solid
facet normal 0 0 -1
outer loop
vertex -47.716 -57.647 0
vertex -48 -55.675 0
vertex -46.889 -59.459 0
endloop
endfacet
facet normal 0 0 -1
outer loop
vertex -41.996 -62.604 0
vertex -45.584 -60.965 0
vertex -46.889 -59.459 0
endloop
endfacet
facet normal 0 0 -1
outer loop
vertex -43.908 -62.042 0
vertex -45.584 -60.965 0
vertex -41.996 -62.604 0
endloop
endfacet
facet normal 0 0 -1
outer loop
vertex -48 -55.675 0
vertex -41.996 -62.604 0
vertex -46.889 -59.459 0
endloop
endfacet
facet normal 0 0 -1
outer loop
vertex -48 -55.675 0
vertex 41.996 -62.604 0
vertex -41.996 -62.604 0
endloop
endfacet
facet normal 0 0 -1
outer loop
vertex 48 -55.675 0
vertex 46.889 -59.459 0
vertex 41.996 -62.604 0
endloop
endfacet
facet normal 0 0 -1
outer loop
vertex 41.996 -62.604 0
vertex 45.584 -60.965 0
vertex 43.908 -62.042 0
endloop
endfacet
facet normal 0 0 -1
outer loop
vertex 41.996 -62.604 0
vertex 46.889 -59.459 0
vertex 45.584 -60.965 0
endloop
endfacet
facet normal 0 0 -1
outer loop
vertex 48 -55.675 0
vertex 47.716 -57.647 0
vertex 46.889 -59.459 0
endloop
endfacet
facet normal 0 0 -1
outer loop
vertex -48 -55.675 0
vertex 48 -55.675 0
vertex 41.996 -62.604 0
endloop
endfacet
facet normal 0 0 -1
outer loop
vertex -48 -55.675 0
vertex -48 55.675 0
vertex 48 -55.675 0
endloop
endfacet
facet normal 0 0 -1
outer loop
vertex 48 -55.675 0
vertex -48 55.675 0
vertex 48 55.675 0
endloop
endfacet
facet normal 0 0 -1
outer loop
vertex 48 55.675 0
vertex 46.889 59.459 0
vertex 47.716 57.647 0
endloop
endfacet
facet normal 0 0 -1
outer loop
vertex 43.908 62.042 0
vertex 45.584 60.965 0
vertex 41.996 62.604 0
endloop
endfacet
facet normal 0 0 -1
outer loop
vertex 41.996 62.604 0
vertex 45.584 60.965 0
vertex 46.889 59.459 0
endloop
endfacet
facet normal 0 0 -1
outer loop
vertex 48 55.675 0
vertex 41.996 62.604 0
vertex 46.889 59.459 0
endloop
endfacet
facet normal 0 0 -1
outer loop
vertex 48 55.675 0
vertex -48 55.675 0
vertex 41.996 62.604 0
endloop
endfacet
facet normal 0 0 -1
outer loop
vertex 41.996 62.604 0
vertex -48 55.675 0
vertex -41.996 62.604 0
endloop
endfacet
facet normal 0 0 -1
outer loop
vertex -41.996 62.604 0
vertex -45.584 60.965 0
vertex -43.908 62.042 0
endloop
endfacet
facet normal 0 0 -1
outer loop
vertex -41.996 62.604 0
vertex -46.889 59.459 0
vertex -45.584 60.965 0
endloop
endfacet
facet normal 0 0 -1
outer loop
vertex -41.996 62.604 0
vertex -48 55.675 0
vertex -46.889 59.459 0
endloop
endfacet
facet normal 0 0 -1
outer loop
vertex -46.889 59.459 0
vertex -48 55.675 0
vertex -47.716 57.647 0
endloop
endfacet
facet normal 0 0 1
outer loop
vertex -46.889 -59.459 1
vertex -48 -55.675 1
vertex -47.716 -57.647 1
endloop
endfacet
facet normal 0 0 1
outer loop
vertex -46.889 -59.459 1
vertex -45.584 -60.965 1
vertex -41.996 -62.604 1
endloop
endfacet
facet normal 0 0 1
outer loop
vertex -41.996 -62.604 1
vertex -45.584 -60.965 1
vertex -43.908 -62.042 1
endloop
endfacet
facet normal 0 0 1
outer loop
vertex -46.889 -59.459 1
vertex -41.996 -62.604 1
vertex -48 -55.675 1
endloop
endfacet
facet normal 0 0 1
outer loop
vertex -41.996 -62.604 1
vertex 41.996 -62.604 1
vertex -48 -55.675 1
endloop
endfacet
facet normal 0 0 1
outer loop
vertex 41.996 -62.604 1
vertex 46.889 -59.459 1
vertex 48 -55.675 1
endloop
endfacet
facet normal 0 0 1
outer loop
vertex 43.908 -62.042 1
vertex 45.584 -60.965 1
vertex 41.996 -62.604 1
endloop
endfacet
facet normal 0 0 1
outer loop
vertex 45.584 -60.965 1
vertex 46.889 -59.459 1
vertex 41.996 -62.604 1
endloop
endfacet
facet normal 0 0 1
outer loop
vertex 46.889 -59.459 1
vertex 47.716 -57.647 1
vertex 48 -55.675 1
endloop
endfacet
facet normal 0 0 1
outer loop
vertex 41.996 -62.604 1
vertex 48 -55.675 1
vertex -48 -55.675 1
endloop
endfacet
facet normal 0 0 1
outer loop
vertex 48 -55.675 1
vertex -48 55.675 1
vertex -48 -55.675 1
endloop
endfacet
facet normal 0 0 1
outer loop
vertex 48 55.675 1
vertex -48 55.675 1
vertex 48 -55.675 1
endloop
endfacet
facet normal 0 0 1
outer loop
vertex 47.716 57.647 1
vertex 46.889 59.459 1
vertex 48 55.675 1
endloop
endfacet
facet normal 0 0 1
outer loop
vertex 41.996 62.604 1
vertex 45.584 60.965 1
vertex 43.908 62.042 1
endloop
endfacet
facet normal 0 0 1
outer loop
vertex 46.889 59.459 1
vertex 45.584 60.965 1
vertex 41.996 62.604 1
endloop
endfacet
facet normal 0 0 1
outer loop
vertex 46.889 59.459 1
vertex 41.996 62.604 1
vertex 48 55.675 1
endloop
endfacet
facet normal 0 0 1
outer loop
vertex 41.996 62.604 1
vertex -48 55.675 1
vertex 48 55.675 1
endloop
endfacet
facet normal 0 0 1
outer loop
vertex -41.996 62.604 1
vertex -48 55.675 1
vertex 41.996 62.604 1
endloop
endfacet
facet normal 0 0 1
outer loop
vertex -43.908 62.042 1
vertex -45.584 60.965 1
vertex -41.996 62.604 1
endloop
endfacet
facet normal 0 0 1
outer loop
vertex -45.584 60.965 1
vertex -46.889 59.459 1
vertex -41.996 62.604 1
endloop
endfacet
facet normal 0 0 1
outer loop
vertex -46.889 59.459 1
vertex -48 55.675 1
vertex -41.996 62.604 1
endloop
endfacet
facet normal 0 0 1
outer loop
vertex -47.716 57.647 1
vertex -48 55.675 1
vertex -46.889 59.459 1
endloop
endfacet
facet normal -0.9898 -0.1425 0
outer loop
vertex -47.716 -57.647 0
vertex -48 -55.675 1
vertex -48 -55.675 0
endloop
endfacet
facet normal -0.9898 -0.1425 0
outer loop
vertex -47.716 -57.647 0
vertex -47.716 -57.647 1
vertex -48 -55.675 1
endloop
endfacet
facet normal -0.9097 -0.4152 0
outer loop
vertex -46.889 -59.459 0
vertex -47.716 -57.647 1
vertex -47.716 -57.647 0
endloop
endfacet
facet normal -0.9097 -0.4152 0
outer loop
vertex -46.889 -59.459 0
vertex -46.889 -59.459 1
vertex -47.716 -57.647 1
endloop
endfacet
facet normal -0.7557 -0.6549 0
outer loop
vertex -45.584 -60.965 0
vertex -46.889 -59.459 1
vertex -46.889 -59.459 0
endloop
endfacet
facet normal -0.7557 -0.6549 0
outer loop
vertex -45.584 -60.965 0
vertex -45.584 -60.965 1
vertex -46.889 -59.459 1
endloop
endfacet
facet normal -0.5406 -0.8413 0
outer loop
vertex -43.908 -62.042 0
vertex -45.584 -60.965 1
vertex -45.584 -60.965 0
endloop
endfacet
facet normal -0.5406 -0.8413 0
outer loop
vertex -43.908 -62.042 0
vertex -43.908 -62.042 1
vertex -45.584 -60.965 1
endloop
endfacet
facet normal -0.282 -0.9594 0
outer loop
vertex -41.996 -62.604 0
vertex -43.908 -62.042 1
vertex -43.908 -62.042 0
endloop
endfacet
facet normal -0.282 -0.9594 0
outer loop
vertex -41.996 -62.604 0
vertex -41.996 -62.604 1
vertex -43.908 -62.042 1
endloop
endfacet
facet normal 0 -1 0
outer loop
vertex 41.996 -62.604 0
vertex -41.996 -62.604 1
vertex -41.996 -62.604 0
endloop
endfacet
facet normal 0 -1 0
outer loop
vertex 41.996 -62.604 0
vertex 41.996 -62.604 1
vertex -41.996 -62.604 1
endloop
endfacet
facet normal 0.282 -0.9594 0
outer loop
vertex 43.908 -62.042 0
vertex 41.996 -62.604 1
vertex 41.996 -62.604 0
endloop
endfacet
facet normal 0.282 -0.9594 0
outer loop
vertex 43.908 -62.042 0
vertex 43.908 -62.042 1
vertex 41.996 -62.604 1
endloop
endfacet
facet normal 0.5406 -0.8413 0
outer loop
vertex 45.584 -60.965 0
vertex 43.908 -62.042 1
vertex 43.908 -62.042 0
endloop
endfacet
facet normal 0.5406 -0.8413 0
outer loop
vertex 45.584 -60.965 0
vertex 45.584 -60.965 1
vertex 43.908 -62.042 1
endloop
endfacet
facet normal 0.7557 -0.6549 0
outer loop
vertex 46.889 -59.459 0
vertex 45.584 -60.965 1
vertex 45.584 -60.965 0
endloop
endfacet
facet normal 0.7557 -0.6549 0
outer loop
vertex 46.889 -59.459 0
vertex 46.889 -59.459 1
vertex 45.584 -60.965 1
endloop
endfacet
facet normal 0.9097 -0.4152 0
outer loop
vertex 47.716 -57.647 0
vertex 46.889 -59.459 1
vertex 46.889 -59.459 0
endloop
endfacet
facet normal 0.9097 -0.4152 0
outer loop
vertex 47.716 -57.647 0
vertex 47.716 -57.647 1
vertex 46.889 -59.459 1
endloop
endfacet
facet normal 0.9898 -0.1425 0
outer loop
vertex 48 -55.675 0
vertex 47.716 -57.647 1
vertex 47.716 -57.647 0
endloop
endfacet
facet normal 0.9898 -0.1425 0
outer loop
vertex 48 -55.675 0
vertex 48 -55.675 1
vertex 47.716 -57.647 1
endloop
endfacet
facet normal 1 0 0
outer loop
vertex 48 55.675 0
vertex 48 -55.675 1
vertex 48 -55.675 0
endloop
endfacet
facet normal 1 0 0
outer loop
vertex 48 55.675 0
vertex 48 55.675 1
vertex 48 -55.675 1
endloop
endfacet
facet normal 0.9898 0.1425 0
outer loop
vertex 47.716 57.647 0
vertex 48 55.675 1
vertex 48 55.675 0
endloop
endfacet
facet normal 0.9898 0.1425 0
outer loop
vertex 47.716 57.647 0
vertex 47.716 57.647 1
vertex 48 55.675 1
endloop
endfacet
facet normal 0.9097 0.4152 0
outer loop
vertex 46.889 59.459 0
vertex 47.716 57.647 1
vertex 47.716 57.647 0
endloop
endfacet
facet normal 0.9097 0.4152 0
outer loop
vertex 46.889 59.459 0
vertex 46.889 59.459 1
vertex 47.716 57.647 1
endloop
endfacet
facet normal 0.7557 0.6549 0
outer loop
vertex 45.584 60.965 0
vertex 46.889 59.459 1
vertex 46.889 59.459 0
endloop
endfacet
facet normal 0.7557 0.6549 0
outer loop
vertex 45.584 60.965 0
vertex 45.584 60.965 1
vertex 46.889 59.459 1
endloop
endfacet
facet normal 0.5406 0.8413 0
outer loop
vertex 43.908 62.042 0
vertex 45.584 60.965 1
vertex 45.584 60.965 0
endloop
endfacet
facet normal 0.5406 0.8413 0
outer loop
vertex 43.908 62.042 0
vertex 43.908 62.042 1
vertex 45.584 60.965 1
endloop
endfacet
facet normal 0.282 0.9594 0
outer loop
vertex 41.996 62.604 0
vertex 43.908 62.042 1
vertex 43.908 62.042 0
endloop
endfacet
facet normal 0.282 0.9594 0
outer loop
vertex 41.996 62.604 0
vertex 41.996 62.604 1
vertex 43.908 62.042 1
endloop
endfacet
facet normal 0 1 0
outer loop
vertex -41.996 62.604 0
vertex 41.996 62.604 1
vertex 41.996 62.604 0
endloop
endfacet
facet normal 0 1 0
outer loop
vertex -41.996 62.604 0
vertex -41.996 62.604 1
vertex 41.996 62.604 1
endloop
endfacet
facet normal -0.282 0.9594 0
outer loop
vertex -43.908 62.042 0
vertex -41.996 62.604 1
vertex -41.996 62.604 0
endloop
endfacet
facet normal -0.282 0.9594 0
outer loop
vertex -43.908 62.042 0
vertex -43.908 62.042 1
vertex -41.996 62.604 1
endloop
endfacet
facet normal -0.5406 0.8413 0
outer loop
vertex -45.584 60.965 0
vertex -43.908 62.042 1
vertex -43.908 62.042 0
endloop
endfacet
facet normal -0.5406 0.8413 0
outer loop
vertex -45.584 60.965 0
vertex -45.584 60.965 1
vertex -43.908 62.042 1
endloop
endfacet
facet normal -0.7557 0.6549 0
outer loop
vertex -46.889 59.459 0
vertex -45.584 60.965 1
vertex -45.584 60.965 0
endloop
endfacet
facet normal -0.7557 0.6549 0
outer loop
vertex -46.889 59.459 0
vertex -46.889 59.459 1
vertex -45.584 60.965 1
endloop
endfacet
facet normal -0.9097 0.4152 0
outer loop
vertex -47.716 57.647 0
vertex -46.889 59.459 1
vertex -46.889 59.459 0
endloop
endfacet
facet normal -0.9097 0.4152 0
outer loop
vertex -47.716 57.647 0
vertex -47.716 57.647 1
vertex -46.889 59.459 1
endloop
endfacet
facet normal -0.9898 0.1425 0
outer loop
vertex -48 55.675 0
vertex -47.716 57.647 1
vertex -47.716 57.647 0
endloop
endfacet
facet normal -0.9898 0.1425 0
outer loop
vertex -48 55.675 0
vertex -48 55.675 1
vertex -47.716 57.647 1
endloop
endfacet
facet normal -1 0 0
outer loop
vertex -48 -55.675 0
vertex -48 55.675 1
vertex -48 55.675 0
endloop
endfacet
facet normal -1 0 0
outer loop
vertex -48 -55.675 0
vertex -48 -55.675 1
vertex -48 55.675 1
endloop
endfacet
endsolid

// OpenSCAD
module plate()
{
  h = 1;
  r = 7;
  spacing = 1.5;
  size = [85, 114.35] - 2*spacing*[1,1];

  linear_extrude(h)
    hull()
      for(dx=[-1, +1])
        for(dy=[-1, +1])
          translate([dx*size.x/2, dy*size.y/2])
            circle(r=r);
}

plate();
